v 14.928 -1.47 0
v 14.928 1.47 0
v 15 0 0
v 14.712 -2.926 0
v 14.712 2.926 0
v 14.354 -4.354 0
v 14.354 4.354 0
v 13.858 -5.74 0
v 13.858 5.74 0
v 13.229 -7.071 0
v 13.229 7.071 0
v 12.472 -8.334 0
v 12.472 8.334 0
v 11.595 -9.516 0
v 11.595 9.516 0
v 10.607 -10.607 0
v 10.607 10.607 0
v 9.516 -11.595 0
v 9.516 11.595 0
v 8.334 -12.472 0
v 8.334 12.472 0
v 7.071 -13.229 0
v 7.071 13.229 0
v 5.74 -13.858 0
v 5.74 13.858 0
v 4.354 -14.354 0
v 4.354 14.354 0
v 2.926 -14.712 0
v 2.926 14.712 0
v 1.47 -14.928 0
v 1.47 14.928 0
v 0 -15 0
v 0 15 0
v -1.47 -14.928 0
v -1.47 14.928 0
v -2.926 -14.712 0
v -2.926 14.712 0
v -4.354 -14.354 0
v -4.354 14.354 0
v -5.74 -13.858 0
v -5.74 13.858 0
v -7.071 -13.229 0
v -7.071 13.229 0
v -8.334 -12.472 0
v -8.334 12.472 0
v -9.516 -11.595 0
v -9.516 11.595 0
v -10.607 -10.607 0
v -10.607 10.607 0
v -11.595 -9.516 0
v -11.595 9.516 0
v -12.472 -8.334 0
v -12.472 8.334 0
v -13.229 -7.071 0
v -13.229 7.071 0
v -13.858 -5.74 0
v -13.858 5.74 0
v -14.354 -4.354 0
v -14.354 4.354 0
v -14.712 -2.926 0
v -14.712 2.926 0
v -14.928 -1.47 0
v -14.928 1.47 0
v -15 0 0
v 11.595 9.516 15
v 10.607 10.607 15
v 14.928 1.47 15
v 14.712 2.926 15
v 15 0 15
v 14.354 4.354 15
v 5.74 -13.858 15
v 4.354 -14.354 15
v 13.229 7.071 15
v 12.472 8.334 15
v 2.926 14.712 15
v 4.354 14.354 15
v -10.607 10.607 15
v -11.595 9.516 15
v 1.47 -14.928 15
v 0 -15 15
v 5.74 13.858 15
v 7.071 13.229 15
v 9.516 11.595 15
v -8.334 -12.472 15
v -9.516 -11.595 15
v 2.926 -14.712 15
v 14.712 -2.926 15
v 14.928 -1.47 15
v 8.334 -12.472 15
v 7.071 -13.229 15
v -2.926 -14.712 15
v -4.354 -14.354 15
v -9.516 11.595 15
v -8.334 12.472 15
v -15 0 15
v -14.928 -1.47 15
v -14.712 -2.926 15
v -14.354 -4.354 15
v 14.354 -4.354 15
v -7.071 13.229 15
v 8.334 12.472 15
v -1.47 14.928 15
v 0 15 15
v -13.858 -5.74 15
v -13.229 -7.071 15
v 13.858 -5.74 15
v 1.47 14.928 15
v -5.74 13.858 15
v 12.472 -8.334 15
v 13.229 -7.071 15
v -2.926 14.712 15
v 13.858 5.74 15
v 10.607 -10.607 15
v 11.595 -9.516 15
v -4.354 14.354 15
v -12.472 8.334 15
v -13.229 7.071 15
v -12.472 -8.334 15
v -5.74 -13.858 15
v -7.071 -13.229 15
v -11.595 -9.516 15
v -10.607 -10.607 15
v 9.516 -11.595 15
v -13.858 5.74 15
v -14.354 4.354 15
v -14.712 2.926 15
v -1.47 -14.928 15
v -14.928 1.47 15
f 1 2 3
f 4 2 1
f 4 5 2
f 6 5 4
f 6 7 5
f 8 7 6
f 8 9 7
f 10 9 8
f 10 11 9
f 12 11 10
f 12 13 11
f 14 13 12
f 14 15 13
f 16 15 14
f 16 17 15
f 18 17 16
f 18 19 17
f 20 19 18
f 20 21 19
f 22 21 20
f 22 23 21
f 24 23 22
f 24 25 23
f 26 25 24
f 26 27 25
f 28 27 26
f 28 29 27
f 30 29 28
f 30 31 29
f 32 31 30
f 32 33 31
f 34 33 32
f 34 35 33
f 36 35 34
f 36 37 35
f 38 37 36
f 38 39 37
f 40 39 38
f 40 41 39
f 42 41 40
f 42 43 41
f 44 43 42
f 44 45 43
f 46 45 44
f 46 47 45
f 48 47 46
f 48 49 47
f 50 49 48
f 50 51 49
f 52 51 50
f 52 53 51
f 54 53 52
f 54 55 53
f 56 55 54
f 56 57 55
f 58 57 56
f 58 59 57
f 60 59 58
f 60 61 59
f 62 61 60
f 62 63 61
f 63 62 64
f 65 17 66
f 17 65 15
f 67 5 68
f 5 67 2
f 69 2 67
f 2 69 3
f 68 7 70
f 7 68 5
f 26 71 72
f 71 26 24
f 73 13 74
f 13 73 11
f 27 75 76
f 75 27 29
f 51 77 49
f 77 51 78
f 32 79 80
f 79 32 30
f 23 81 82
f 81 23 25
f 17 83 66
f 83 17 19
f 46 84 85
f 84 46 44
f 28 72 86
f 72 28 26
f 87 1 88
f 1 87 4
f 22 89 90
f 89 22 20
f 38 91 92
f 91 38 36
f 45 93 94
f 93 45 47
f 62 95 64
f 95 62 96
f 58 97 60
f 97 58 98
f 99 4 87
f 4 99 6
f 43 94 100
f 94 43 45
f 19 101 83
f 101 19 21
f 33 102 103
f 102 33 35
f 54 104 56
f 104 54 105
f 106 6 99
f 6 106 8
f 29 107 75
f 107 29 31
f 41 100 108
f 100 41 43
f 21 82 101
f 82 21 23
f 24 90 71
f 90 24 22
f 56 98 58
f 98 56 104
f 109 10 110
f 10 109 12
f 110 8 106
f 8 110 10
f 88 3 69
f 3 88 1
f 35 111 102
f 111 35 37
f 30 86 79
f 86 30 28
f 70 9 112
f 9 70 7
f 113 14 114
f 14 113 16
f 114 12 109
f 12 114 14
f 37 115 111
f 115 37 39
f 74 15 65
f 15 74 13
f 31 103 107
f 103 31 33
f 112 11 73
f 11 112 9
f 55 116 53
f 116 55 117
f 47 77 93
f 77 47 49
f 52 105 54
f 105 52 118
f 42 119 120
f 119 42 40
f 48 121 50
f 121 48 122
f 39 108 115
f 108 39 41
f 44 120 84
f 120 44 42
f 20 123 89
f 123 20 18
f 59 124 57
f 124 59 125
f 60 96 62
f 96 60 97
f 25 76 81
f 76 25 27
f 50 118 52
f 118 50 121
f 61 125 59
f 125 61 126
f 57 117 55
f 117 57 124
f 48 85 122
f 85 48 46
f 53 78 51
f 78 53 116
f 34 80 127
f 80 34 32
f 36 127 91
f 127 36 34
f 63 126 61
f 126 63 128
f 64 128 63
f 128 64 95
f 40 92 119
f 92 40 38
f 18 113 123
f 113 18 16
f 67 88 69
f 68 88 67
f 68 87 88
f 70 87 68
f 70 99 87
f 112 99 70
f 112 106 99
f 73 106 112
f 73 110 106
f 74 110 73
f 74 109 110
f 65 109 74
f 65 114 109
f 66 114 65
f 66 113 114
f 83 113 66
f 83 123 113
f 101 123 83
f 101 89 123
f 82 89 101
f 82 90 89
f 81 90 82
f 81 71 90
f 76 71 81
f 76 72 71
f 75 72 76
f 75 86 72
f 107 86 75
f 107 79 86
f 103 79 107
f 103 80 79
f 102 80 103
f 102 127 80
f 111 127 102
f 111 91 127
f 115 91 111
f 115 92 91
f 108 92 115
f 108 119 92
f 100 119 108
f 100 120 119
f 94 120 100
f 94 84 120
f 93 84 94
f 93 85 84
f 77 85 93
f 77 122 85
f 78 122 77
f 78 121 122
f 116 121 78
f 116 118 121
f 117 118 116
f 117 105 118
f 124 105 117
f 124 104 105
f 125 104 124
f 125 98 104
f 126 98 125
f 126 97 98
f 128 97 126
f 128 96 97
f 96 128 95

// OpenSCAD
// Replacement knob for hotplate stirrer
// Dimensions measured with calipers

// Main body dimensions
knob_diameter = 30;
knob_radius = knob_diameter / 2;
knob_height = 15;

// D-shaft bore dimensions
bore_diameter = 6.2;
bore_radius = bore_diameter / 2;
bore_depth = 12;
// Distance from flat to opposite side of circle is 4.7 mm
// The flat is offset from center by: bore_radius - (4.7 - bore_radius) = 2*bore_radius - 4.7
flat_offset = bore_radius - (4.7 - bore_radius);

// Grip groove dimensions
num_grooves = 18;
groove_diameter = 2;
groove_radius = groove_diameter / 2;

// Pointer groove dimensions
pointer_width = 1.5;
pointer_depth = 1;

// Set resolution for smooth curves
$fn = 64;

// Main knob body
translate([0, 0, 0])
    cylinder(h = knob_height, r = knob_radius, center = false);

// Subtract D-shaped blind bore
// The bore goes from z=0 to z=12
// D-shape: cylinder with flat on +Y side
// We subtract a cylinder, then add back the material that was removed by the flat cut?
// No, difference() subtracts the union of all children.
// So we define the D-shape as: Cylinder MINUS RectangularBlock
// But in difference(A, B, C), we subtract B and C from A.
// We want to subtract the D-shape from the knob.
// D-shape = Cylinder - Block.
// So we want to subtract (Cylinder - Block) from Knob.
// This is equivalent to: Subtract Cylinder, then Add Block back.
// OpenSCAD difference() only subtracts. It doesn't add.
// So we must define the D-shape as a single solid to subtract.
// A D-shape is a cylinder with a flat side.
// We can model the D-shape as a cylinder, and then use a difference to cut the flat.
// But we are already inside a difference() for the main knob.
// So: difference(Knob, DShape).
// DShape = difference(Cylinder, Block).
// We can nest this: difference(Knob, difference(Cylinder, Block)) is not valid syntax directly.
// Instead, we can use: difference(Knob, Cylinder) then union(Block) is not possible in one go.
// Correct approach: Define the D-shape as a module or use a single difference with the cylinder and the block as separate subtrahends?
// No, if we subtract the cylinder and subtract the block, we get a hole that is Cylinder + Block, which is wrong.
// We want to subtract the Cylinder, but NOT subtract the Block part.
// So we subtract the Cylinder, and then we ADD the Block back.
// Since difference() only subtracts, we can't add.
// Alternative: Model the D-shape as a polygon and extrude it.
// Or: Use a difference to create the D-shape solid, then subtract that solid from the knob.
// Let's create the D-shape solid first.

// D-shape solid: Cylinder with a flat cut on the +Y side.
// The flat is at y = flat_offset.
// The block to remove is from y = flat_offset to y = bore_radius + epsilon.
// Width of block: bore_diameter + epsilon (to cover the whole width of the cylinder at that y).
// Actually, the block should be wide enough to cut the entire chord.
// The cylinder is centered at 0,0.
// The flat is at y = flat_offset.
// We remove the part of the cylinder where y > flat_offset.
// So the block is: x from -bore_radius to bore_radius, y from flat_offset to bore_radius + epsilon, z from -epsilon to bore_depth + epsilon.

// Let's define the D-shape bore as a module for clarity, but we can't use modules in the final code block if we want it self-contained without includes?
// Modules are built-in. Yes.

module d_shaped_bore() {
    difference() {
        cylinder(h = bore_depth + 0.1, r = bore_radius, center = false);
        // Cut the flat
        translate([-bore_radius - 0.1, flat_offset, -0.05])
            cube([bore_diameter + 0.2, bore_radius - flat_offset + 0.1, bore_depth + 0.2]);
    }
}

// Now subtract the D-shaped bore from the knob
difference() {
    // Main body
    cylinder(h = knob_height, r = knob_radius, center = false);
    
    // D-shaped bore
    d_shaped_bore();
    
    // 18 evenly spaced vertical grip grooves
    for (i = [0 : num_grooves - 1]) {
        angle = i * 360 / num_grooves;
        translate([
            knob_radius * cos(angle),
            knob_radius * sin(angle),
            0
        ])
        rotate([0, 0, -angle])
        // Half-cylinder groove
        // Centered on the outer surface, so the center of the cylinder is at the surface.
        // We want the groove to cut into the knob.
        // The half-cylinder should be oriented such that the curved part is inside the knob.
        // So we take a cylinder and cut away the half that is outside.
        difference() {
            cylinder(h = knob_height + 0.1, r = groove_radius, center = false);
            // Cut away the half that is outside (positive X direction in local coords)
            translate([0, -0.05, -0.05])
                cube([groove_radius + 0.1, groove_diameter + 0.1, knob_height + 0.2]);
        }
    }
    
    // Pointer groove on top face
    // 1.5 mm wide, 1 mm deep, from center to outer edge
    // On the same side as the flat of the D (+Y direction)
    translate([0, knob_radius / 2, knob_height - pointer_depth])
        cube([pointer_width, knob_radius, pointer_depth + 0.1], center = true);
}
